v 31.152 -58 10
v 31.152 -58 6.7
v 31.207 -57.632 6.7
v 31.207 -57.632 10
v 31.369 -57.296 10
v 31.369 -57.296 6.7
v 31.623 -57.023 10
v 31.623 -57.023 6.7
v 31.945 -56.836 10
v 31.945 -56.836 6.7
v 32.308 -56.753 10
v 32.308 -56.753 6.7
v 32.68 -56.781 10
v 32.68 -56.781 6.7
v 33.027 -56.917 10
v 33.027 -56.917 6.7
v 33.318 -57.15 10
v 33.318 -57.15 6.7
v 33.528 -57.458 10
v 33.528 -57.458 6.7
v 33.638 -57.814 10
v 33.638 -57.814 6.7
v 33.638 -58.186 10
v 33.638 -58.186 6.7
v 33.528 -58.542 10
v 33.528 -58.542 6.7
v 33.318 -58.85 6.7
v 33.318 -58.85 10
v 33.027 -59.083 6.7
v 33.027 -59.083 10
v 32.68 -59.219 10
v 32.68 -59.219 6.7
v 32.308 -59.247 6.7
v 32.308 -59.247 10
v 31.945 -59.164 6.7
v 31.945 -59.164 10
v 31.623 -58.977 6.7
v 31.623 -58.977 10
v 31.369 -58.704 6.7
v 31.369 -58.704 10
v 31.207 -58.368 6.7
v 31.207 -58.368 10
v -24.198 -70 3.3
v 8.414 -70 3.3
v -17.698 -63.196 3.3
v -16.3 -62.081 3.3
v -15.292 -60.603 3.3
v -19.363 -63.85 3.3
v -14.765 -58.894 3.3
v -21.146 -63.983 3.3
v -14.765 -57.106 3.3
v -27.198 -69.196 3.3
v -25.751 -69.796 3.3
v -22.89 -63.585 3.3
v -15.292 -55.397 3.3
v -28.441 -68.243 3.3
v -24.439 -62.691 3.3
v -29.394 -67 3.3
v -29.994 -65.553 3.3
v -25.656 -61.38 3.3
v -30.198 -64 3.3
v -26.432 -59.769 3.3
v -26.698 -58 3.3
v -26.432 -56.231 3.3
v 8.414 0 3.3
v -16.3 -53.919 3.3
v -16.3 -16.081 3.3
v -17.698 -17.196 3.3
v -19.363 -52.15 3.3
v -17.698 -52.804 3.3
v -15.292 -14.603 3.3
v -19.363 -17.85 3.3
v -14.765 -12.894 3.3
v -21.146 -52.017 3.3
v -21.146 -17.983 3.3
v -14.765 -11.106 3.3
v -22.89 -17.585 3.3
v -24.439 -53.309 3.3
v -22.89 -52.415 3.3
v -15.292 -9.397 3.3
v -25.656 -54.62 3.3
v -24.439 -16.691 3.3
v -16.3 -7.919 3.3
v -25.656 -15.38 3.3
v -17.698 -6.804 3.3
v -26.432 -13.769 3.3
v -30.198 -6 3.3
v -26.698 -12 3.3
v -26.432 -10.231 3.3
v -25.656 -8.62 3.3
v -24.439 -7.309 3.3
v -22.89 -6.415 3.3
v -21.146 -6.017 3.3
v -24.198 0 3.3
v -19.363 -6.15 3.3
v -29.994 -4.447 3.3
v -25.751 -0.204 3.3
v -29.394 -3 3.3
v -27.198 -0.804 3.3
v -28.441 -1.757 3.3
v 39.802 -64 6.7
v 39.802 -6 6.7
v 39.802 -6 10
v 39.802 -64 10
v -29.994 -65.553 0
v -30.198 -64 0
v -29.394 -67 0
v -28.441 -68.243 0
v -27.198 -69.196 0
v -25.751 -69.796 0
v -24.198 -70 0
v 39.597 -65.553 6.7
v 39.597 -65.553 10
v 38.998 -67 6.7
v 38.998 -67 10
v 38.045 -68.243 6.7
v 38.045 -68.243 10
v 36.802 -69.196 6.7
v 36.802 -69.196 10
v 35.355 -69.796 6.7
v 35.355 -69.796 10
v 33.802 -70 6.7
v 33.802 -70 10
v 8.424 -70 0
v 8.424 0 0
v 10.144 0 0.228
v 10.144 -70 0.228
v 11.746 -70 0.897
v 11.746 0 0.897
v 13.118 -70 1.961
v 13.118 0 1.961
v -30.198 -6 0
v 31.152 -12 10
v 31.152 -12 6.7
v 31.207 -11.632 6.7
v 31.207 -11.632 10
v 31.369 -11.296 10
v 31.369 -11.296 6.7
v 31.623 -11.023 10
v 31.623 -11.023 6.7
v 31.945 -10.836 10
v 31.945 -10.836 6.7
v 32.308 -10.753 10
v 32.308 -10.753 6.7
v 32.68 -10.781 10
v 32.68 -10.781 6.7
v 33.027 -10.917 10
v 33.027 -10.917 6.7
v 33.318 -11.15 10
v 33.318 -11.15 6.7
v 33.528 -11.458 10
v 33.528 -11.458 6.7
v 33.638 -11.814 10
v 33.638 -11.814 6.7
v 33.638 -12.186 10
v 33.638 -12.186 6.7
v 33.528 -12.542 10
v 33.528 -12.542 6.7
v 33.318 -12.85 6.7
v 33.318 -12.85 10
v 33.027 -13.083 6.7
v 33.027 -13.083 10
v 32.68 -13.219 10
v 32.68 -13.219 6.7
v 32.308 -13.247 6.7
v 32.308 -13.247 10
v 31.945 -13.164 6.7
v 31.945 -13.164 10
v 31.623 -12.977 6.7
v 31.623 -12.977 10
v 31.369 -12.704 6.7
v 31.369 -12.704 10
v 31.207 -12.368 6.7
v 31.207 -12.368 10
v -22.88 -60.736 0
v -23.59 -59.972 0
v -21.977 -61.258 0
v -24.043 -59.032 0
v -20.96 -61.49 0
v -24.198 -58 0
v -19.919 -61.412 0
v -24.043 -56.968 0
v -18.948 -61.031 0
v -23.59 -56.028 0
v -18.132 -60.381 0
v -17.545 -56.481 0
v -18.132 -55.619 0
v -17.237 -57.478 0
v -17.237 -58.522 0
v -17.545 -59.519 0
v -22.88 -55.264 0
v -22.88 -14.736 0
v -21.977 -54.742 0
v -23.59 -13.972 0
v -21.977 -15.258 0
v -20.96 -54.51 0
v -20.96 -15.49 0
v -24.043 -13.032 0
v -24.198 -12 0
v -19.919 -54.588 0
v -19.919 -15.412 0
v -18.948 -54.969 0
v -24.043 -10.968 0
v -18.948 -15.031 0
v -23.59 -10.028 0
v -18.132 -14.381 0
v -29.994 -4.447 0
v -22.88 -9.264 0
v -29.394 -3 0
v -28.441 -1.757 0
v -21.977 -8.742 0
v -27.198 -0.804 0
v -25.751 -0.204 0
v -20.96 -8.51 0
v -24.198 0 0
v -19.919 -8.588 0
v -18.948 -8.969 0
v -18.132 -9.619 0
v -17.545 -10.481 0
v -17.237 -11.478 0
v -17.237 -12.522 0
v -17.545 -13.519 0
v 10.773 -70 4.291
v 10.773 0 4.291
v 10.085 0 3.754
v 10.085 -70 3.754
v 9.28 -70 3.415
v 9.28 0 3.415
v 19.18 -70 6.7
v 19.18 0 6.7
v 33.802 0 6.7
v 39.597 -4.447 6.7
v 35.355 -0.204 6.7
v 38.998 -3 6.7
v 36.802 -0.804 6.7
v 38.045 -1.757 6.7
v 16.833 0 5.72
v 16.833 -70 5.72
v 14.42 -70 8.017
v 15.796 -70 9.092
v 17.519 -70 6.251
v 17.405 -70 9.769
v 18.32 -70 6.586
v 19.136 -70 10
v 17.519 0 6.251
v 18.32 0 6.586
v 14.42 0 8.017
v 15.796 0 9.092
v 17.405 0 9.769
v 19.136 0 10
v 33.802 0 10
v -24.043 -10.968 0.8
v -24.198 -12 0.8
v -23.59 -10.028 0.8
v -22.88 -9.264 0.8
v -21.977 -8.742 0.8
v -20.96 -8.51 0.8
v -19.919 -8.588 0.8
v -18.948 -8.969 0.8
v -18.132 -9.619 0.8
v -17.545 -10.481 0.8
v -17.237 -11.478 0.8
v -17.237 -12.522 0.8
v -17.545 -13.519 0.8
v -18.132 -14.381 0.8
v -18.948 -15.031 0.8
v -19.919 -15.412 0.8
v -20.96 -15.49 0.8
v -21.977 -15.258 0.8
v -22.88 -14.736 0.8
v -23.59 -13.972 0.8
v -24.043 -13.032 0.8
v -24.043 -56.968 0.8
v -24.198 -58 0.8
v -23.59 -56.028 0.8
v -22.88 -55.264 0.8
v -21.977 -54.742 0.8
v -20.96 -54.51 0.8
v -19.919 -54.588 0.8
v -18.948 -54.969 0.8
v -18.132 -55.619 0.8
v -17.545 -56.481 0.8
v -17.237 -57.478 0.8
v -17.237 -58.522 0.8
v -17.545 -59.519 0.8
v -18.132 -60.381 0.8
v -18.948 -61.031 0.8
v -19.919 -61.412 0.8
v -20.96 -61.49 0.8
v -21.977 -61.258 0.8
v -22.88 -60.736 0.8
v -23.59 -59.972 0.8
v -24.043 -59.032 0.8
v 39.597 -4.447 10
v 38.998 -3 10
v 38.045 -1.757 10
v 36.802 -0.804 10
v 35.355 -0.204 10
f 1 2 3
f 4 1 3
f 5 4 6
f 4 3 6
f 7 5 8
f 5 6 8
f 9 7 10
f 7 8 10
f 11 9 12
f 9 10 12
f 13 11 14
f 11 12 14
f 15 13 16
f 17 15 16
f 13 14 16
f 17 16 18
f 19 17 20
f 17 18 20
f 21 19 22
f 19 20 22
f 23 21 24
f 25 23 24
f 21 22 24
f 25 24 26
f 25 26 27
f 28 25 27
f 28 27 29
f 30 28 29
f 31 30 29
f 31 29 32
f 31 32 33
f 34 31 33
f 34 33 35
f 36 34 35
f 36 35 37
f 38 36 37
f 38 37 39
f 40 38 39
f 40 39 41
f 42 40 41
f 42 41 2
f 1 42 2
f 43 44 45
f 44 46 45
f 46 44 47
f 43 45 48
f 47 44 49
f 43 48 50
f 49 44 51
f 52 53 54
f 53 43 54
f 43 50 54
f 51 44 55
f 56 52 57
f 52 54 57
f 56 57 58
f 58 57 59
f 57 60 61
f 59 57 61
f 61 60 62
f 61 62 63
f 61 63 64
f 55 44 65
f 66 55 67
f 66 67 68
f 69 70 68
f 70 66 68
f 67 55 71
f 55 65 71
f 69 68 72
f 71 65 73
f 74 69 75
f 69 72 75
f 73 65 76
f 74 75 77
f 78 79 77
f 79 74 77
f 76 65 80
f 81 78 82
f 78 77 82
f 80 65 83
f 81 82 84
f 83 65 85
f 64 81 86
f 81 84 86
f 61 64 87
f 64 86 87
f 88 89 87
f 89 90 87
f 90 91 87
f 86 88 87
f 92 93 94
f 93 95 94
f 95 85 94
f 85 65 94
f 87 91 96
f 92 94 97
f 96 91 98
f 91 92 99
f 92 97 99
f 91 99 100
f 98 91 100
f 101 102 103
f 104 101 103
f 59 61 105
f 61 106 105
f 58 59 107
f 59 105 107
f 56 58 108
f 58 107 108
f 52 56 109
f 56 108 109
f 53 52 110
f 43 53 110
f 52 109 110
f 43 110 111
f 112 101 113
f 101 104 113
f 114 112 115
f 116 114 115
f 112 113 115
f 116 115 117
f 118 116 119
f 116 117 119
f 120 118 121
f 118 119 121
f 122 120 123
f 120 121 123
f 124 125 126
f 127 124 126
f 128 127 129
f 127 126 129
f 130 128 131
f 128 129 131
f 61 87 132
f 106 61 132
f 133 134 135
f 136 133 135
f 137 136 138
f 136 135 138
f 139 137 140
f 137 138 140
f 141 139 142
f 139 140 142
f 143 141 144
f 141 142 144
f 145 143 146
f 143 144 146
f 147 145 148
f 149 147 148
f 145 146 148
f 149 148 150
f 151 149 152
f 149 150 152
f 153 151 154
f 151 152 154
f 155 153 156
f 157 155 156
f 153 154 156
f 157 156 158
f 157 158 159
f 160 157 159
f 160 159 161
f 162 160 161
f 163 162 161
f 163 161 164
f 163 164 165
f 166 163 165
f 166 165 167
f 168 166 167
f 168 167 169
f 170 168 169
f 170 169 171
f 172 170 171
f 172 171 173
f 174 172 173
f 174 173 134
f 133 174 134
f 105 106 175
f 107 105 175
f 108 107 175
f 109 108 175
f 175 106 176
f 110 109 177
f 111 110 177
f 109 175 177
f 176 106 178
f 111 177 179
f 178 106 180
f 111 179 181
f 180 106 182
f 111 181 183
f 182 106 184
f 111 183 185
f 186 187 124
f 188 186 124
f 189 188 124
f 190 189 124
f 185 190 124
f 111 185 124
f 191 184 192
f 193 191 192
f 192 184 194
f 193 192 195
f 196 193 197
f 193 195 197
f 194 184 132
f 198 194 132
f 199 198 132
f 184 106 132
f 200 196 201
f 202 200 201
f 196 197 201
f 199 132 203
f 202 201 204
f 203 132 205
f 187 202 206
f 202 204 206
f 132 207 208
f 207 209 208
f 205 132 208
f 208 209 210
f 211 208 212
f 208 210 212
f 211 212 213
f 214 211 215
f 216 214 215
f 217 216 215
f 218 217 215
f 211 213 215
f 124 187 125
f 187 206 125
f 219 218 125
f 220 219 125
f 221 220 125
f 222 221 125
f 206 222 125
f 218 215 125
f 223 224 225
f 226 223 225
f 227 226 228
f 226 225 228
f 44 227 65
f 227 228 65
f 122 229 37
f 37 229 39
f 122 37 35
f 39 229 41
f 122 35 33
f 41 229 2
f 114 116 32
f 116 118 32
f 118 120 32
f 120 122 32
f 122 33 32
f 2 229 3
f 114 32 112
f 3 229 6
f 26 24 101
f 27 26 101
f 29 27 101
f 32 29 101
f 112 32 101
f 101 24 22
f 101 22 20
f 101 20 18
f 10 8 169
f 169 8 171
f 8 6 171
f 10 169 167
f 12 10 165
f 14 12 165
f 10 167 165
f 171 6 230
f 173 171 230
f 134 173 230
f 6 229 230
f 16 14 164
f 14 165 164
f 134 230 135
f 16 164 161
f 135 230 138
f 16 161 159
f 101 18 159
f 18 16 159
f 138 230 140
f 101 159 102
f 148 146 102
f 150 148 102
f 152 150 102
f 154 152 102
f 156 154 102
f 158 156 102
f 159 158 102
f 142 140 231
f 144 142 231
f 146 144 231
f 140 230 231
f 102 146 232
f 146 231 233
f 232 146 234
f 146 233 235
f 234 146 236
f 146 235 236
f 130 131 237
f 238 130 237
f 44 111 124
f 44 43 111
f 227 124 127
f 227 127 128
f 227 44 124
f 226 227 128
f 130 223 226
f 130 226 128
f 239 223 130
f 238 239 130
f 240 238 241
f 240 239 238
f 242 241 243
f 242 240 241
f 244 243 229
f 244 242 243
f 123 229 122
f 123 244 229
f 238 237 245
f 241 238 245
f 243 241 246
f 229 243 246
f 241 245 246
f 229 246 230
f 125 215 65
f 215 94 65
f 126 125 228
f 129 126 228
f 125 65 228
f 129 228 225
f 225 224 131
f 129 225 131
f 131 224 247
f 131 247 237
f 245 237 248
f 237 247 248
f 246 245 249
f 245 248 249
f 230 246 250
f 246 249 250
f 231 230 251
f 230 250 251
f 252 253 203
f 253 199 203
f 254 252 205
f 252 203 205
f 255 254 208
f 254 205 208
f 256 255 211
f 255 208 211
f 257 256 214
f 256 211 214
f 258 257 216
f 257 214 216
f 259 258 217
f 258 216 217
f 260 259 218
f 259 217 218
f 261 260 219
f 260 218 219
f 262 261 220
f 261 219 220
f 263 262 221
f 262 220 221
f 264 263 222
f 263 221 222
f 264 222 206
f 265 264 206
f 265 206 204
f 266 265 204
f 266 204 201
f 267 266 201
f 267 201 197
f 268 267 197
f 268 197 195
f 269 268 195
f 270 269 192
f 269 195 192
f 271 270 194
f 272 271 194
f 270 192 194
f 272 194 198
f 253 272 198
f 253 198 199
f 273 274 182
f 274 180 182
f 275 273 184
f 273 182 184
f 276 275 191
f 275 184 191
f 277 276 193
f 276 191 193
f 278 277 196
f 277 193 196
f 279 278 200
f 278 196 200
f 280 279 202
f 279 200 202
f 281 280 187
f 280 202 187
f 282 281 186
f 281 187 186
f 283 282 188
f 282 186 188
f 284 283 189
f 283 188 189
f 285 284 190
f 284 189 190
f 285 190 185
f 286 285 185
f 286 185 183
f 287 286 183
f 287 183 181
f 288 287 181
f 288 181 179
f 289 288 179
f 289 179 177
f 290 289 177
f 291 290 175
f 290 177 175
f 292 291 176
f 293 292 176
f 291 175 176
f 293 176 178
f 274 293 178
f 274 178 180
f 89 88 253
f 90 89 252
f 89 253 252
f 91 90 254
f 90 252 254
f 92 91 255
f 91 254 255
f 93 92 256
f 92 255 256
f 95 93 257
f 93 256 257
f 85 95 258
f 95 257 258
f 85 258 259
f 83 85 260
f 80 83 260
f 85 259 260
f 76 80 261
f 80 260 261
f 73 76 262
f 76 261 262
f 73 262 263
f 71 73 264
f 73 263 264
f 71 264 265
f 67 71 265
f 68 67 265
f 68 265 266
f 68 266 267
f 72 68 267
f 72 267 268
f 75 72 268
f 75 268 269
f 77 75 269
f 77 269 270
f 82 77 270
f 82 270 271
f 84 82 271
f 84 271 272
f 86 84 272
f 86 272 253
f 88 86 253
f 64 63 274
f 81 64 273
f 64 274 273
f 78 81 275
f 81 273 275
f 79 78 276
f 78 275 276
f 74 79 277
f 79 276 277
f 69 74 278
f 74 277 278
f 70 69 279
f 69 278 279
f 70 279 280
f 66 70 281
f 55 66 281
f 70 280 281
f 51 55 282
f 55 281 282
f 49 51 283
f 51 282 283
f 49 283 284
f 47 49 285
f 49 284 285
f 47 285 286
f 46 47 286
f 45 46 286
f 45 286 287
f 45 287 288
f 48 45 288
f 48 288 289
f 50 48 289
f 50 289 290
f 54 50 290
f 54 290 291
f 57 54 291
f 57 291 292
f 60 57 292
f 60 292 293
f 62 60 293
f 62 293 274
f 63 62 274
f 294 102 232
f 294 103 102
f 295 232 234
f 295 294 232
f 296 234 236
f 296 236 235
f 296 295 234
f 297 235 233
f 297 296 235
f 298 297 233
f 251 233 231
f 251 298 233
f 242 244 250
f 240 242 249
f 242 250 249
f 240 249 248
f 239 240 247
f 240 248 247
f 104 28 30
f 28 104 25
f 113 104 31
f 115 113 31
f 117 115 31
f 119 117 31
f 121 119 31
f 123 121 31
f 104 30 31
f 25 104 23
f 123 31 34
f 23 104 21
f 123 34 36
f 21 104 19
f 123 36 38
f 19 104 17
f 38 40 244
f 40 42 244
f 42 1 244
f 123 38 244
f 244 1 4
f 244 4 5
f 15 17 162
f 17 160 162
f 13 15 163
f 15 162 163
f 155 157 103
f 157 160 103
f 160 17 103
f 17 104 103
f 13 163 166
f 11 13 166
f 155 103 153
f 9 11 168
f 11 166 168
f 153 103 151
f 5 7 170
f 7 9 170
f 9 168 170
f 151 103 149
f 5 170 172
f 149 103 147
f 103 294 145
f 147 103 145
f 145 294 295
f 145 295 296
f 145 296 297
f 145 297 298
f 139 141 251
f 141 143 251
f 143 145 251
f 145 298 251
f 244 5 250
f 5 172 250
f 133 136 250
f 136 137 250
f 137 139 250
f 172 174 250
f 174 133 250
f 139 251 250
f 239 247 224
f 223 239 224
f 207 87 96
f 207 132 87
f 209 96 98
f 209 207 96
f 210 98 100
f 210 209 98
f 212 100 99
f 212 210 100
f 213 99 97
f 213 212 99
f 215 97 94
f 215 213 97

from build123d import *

# Parameters (mm, degrees)
F1_DEPTH       = 70
F2_R           = 6
F4_D           = 2.5
F6_D           = 7
F6_CSINK_D     = 12
F6_CSINK_ANGLE = 90


with BuildPart() as f1:
    # F0 (on Front) → F1 (new body)
    with BuildSketch(Plane.XZ):
        with BuildLine():
            Line((-30.1981142707, 3.3), (-30.1981142707, 0))
            Line((-30.1981142707, 0), (8.4236085474, 0))
            ThreePointArc((8.4236085474, 0), (10.9672225435, 0.509841723), (13.117854557, 1.9605976245))
            Line((13.117854557, 1.9605976245), (16.8330399063, 5.7197011877))
            ThreePointArc((16.8330399063, 5.7197011877), (17.9083559131, 6.4450791385), (19.1801629111, 6.7))
            Line((19.1801629111, 6.7), (39.8018857293, 6.7))
            Line((39.8018857293, 6.7), (39.8018857293, 10))
            Line((39.8018857293, 10), (19.1359616287, 10))
            ThreePointArc((19.1359616287, 10), (16.5778868369, 9.4840984015), (14.4197256433, 8.0170464726))
            Line((14.4197256433, 8.0170464726), (10.7725102503, 4.2914767637))
            ThreePointArc((10.7725102503, 4.2914767637), (9.6934296535, 3.5579507992), (8.4143922576, 3.3))
            Line((8.4143922576, 3.3), (-30.1981142707, 3.3))
        make_face()
    extrude(amount=F1_DEPTH)

    # F2
    f2_edges = [f1.edges().sort_by_distance(p)[0] for p in [
        (-30.198114, 0, 1.65),
        (-30.198114, -70, 1.65),
        (39.801886, -70, 8.35),
        (39.801886, 0, 8.35),
    ]]
    fillet(f2_edges, radius=F2_R)

    # F4 (through all)
    with Locations(Plane.XY.offset(10)):
        with Locations((32.4018857293, -12), (32.4018857293, -58)):
            Hole(F4_D / 2)

    # F6 (through all)
    with Locations(Plane.XY.offset(3.3)):
        with Locations((-20.6981142707, -12), (-20.6981142707, -58)):
            CounterSinkHole(F6_D / 2, F6_CSINK_D / 2, counter_sink_angle=F6_CSINK_ANGLE)


solid = f1.part
